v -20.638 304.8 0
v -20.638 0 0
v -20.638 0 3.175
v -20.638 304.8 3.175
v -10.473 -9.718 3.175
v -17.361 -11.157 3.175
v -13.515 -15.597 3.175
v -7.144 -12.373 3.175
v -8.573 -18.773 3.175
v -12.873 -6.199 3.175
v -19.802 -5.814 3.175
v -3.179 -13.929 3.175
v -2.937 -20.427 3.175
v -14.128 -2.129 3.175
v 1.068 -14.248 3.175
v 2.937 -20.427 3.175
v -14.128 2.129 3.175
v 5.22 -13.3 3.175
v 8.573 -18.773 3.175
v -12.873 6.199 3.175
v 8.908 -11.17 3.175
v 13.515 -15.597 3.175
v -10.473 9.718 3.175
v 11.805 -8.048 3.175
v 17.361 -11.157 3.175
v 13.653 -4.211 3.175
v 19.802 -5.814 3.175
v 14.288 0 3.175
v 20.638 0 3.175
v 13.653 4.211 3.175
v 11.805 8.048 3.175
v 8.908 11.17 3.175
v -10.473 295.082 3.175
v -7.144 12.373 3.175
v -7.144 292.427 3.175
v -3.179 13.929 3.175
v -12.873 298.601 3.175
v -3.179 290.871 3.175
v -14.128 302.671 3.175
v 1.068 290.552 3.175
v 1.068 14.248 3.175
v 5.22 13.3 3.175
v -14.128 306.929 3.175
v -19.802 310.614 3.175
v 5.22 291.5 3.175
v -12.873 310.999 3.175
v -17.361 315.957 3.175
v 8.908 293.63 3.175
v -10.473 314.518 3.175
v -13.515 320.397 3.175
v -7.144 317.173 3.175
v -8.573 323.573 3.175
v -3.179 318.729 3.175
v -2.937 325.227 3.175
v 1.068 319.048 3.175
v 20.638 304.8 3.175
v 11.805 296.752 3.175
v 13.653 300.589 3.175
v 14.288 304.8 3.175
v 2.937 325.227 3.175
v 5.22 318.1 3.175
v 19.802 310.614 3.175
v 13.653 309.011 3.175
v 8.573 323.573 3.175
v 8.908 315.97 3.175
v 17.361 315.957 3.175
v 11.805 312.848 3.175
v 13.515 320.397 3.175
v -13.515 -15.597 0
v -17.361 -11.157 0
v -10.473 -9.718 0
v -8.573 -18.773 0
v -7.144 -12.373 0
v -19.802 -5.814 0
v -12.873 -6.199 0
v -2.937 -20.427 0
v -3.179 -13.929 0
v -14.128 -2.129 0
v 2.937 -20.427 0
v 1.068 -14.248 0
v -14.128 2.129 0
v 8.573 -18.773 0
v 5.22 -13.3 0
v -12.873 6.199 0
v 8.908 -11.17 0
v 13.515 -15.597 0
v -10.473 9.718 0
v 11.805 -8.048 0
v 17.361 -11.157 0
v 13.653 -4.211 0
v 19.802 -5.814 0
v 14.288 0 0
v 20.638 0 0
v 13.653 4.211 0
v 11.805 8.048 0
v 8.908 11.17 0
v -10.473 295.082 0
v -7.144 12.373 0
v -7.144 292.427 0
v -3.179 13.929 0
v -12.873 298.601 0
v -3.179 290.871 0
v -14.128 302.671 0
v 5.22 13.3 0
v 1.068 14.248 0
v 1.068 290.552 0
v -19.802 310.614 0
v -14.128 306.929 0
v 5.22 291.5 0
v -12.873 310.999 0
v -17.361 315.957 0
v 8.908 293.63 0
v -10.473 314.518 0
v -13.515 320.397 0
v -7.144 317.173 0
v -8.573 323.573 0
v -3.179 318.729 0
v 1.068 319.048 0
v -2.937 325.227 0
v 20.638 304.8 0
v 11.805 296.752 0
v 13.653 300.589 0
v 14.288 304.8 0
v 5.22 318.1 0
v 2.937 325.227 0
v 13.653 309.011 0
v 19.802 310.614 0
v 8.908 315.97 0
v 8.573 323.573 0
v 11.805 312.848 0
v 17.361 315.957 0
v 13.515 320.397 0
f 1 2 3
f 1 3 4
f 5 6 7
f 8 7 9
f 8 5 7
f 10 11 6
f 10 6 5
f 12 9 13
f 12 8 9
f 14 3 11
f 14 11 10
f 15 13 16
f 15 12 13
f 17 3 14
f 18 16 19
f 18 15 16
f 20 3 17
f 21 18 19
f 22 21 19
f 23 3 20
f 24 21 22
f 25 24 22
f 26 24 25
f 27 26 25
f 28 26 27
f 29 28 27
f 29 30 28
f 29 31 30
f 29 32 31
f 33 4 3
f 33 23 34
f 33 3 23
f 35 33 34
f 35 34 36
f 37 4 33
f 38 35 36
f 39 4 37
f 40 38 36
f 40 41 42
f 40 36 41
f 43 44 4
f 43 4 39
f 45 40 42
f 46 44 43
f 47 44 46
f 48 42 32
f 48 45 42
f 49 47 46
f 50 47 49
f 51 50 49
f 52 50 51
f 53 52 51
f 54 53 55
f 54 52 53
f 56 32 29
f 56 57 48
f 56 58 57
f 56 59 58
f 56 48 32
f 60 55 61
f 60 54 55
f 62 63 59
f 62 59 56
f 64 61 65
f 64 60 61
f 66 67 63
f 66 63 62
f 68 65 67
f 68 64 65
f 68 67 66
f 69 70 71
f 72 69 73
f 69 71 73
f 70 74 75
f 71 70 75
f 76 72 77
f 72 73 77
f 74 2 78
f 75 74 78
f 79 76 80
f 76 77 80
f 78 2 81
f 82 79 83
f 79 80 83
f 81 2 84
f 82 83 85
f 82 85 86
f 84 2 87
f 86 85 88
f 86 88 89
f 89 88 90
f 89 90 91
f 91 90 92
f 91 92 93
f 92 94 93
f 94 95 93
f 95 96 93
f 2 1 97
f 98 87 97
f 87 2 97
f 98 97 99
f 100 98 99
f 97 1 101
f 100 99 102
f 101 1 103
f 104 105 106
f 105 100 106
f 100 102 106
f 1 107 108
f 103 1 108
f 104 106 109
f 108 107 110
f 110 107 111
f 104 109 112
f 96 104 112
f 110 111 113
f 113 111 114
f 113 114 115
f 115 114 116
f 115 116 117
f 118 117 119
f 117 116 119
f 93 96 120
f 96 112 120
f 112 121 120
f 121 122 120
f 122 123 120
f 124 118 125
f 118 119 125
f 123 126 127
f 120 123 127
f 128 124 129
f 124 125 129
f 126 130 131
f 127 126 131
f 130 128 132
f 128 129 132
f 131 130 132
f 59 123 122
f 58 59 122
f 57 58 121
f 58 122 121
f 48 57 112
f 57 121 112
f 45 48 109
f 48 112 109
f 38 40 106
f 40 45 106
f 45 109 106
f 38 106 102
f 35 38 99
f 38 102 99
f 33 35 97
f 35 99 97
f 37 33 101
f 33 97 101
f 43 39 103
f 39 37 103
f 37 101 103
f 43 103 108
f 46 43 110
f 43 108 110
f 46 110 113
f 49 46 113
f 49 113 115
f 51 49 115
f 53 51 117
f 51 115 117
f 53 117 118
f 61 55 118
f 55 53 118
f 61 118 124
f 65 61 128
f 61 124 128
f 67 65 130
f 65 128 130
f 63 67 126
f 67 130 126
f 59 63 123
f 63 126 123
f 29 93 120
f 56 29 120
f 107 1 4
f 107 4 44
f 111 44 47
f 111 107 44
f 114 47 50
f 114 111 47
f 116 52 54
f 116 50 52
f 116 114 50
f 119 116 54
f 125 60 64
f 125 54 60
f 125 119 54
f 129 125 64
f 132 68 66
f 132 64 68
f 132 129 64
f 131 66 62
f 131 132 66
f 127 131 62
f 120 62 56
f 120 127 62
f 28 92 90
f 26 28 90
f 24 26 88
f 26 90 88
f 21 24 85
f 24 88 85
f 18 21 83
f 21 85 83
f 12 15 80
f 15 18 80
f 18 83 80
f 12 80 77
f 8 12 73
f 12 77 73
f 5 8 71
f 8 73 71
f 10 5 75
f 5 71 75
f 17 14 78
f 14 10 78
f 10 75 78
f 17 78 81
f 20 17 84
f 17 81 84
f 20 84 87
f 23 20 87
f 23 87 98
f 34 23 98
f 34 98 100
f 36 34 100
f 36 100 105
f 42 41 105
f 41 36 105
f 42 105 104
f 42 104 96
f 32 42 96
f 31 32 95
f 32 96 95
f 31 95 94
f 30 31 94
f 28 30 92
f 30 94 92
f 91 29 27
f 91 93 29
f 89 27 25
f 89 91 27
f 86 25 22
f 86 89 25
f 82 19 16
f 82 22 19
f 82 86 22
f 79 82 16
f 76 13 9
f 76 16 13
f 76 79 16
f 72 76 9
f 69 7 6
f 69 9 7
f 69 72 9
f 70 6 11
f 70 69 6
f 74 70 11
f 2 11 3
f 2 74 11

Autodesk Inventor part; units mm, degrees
ref_plane "YZ Plane" through (0, 0, 0) normal (1, 0, 0) x (0, 1, 0)
ref_plane "XZ Plane" through (0, 0, 0) normal (0, 1, 0) x (-1, 0, 0)
ref_plane "XY Plane" through (0, 0, 0) normal (0, 0, 1) x (1, 0, 0)
sketch "Sketch1" plane through (0, 0, 0) normal (0, 0, 1) x (1, 0, 0)
  arc A0 (-20.6375, 0) -> (20.6375, 0) centre (0, 0) ccw
  line L0 (-20.6375, 0) -> (-20.6375, 304.8)
  line L1 (20.6375, 0) -> (20.6375, 304.8)
  arc A1 (20.6375, 304.8) -> (-20.6375, 304.8) centre (0, 304.8) ccw
  circle A2 centre (0, 304.8) radius 14.2875
  circle A3 centre (0, 0) radius 14.2875
  arc A4 (-20.6375, 304.8) -> (20.6375, 304.8) centre (0, 304.8) ccw construction
  arc A5 (20.6375, 0) -> (-20.6375, 0) centre (0, 0) ccw construction
  dimension "d0" = 304.8
  dimension "d2" = 28.575
  dimension "d3" = 6.35
extrude "Extrusion1" add sketch "Sketch1" along normal blind 3.175
properties part number "upper-arm-panel"
